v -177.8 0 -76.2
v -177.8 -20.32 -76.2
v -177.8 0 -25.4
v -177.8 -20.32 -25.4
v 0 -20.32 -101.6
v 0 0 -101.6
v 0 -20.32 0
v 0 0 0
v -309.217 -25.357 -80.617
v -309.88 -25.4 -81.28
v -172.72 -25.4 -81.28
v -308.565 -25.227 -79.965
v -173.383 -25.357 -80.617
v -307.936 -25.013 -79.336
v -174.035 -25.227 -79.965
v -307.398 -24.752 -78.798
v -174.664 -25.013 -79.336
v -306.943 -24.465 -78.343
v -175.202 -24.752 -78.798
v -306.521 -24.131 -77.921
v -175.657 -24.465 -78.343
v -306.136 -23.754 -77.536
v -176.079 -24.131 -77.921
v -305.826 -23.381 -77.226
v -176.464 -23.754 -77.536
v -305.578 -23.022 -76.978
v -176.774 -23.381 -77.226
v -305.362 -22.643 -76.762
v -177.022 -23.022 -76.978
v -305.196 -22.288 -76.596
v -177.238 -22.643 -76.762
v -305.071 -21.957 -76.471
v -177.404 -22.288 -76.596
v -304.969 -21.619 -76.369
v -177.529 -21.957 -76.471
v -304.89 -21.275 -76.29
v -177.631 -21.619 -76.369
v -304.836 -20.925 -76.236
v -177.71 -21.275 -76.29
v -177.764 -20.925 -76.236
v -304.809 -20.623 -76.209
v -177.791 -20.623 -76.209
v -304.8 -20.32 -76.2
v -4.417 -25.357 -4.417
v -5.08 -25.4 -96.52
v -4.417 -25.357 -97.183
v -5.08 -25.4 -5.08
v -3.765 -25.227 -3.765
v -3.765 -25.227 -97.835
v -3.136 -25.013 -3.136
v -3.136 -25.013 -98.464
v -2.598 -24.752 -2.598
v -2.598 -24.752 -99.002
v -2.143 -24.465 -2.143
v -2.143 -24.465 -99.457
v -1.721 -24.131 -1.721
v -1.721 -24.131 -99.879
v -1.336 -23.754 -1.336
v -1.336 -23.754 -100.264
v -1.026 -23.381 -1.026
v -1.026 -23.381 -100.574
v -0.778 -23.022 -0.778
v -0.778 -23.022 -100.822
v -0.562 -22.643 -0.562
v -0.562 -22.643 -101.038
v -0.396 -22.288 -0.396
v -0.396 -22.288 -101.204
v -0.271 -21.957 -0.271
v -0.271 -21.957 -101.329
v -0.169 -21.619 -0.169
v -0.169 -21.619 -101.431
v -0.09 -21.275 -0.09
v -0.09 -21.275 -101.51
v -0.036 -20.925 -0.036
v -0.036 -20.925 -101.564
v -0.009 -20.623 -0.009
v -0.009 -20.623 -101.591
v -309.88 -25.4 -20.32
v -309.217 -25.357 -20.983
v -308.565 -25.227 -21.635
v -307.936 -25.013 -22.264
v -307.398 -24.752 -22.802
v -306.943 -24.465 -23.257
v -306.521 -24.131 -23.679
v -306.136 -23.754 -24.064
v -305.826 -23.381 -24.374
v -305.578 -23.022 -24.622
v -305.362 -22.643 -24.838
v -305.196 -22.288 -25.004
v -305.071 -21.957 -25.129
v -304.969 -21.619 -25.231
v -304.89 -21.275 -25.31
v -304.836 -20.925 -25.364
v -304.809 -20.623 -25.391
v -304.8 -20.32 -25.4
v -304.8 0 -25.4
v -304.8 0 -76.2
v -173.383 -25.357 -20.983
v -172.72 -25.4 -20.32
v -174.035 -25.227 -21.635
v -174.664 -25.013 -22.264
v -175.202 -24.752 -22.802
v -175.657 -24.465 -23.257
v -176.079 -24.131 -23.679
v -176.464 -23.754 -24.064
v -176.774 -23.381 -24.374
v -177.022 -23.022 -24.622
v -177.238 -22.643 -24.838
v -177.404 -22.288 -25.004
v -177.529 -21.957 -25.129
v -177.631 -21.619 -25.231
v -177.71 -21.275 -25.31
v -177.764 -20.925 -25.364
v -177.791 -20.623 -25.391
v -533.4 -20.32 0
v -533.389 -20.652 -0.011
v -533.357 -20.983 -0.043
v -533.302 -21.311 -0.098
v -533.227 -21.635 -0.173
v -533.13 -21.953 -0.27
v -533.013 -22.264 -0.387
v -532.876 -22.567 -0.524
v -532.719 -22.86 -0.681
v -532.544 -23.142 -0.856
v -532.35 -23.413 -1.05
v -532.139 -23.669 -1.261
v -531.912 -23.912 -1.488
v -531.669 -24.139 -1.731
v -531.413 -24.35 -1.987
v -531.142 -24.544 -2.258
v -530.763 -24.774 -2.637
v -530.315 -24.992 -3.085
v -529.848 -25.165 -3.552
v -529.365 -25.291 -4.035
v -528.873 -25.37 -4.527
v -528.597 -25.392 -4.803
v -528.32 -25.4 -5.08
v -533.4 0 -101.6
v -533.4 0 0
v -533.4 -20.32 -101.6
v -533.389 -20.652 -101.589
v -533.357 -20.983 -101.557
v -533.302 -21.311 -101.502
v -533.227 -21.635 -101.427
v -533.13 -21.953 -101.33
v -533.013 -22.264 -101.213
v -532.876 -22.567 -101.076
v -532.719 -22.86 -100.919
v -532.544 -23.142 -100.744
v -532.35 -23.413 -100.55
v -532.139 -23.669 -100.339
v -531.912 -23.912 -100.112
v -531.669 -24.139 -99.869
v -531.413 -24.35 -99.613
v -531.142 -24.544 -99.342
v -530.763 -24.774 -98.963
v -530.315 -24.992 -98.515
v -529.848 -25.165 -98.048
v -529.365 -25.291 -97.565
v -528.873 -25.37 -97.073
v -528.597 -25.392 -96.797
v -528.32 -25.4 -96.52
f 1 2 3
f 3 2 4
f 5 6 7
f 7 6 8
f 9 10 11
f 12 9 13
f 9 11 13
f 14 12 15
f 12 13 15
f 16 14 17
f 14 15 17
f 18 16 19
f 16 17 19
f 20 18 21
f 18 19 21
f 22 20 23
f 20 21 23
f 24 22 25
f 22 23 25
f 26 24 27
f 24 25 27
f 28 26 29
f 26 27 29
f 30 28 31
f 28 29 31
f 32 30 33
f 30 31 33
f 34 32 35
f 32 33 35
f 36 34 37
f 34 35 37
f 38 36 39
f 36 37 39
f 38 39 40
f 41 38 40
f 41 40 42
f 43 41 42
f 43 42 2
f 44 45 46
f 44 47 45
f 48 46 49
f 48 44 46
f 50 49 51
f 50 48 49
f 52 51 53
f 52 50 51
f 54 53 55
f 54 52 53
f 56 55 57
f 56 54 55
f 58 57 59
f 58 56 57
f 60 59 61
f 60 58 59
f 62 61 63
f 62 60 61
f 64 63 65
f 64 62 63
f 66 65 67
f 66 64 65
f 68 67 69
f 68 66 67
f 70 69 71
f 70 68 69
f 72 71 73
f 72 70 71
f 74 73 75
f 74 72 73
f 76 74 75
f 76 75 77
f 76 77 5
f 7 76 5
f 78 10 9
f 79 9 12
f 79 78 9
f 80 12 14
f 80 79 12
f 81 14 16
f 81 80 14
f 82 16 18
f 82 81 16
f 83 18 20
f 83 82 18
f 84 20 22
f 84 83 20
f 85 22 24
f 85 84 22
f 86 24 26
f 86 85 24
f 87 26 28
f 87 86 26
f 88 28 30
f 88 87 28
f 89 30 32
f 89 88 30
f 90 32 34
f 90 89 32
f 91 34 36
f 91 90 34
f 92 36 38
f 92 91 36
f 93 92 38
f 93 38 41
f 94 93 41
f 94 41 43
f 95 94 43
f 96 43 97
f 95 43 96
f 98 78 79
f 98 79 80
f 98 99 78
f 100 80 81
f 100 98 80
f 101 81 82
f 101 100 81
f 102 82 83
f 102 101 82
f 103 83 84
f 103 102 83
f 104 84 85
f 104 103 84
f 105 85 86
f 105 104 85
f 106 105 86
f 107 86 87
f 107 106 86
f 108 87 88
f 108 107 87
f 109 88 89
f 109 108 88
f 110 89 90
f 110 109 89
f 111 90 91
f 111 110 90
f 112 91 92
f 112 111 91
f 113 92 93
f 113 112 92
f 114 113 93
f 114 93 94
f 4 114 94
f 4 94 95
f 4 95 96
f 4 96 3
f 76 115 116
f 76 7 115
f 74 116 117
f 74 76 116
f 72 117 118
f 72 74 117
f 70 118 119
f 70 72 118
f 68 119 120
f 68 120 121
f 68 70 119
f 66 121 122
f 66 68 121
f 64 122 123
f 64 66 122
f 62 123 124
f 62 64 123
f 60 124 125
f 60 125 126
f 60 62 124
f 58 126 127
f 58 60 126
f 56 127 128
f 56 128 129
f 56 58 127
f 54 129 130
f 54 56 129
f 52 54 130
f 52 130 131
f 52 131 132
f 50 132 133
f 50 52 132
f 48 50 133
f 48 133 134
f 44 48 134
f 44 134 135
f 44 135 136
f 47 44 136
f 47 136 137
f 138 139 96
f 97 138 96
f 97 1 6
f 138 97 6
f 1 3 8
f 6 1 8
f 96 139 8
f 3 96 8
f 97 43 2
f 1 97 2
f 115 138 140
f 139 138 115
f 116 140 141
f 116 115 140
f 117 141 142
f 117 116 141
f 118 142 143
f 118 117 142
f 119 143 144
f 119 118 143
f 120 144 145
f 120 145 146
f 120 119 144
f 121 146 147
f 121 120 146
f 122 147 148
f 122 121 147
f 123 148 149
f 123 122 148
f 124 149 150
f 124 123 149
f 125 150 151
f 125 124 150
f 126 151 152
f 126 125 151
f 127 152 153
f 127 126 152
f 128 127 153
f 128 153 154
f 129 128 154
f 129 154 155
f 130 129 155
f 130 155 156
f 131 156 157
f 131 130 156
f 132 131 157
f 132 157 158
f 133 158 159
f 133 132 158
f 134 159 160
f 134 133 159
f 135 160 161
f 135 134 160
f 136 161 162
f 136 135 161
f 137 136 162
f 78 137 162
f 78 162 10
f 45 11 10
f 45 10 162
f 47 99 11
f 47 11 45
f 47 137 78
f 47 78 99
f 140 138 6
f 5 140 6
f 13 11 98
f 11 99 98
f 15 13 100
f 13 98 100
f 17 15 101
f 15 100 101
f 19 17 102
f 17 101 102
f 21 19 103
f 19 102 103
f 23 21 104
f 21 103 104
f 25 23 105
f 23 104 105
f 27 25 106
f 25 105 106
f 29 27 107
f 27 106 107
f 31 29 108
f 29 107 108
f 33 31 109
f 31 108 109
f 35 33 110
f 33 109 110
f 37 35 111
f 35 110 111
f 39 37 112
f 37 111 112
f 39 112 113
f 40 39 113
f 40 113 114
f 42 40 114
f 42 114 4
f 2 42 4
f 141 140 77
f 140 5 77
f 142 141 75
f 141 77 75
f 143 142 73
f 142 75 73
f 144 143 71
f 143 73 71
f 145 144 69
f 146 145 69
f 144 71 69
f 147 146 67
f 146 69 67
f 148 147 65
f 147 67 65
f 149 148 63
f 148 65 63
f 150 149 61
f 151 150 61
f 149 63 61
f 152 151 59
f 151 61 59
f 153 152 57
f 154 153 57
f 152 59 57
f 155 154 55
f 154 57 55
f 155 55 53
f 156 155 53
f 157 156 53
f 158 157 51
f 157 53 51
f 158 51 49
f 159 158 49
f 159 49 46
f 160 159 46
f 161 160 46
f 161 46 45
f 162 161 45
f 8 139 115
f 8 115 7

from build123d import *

# Parameters (mm, degrees)
F0_W     = 533.4
F0_H     = 101.6
F1_DEPTH = 25.4
F2_W     = 127
F2_H     = 50.8
F3_DEPTH = 50.8
F4_R     = 5.08


with BuildPart() as f1:
    # F0 (on Front) → F1 (new body)
    with BuildSketch(Plane.XZ):
        with Locations((-266.7, -50.8)):
            Rectangle(F0_W, F0_H)
    extrude(amount=F1_DEPTH)

    # F2 (on face) → F3 (cut)
    with BuildSketch(Plane.XZ.offset(25.4)):
        with Locations((-241.3, -50.8)):
            Rectangle(F2_W, F2_H)
    extrude(amount=-F3_DEPTH, mode=Mode.SUBTRACT)

    # F4
    f4_edges = [f1.edges().sort_by_distance(p)[0] for p in [
        (0, -25.4, -50.8),
        (-266.7, -25.4, -101.6),
        (-266.7, -25.4, 0),
        (-533.4, -25.4, -50.8),
        (-304.8, -25.4, -50.8),
        (-241.3, -25.4, -76.2),
        (-177.8, -25.4, -50.8),
        (-241.3, -25.4, -25.4),
    ]]
    fillet(f4_edges, radius=F4_R)


solid = f1.part
